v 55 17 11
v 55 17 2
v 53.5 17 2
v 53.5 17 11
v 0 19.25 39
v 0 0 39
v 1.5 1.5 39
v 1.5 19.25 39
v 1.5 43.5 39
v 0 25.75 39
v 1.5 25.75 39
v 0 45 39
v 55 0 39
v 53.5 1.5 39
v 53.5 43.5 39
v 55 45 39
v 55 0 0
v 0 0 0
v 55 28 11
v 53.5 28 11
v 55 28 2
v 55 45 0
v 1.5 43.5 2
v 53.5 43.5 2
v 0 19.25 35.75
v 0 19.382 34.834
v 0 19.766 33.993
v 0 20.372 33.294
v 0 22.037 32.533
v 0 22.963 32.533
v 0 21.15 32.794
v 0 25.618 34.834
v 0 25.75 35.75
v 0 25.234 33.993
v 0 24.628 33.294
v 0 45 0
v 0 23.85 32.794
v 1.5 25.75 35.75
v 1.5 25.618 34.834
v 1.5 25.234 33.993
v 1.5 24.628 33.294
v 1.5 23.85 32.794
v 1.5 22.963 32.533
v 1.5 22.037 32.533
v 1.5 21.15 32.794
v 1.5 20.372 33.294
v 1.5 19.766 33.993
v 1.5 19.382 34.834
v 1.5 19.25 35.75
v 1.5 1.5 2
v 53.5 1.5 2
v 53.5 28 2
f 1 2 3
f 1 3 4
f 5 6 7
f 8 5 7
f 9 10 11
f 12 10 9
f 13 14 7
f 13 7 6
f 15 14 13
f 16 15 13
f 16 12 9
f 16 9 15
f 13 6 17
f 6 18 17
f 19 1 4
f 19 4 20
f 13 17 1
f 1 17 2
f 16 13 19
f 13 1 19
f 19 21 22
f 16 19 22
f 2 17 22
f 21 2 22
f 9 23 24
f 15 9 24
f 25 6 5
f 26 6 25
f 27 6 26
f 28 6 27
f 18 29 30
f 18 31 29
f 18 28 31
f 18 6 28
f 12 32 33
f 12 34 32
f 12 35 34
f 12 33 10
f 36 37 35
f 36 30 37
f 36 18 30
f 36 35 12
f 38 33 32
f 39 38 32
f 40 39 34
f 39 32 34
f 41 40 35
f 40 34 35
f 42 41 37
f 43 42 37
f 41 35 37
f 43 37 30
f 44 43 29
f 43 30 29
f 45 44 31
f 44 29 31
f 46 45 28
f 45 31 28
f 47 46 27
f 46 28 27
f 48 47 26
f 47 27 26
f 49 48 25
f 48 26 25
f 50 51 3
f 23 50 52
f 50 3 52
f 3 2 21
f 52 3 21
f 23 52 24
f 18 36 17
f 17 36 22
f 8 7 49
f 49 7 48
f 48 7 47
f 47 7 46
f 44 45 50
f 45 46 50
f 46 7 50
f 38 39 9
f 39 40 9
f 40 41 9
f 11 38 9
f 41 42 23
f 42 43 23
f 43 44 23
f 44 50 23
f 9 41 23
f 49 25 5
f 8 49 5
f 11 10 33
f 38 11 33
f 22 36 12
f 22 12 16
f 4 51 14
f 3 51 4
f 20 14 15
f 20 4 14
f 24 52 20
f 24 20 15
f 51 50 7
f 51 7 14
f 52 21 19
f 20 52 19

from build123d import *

# Parameters (mm, degrees)
F0_W     = 55
F0_H     = 45
F1_DEPTH = 2
F2_W     = 55
F2_H     = 45
F2_W_2   = 51.9999974966
F2_H_2   = 41.9999974966
F3_DEPTH = 37
F5_DEPTH = 25
F6_W     = 11
F6_H     = 9
F7_DEPTH = 25


with BuildPart() as f1:
    # F0 (on Top) → F1 (new body)
    with BuildSketch(Plane.XY):
        with Locations((27.5, 22.5)):
            Rectangle(F0_W, F0_H)
    extrude(amount=F1_DEPTH)

    # F2 (on face) → F3 (join)
    with BuildSketch(Plane.XY.offset(2)):
        with Locations((27.5, 22.5)):
            Rectangle(F2_W, F2_H)
        with Locations((27.5, 22.5)):
            Rectangle(F2_W_2, F2_H_2, mode=Mode.SUBTRACT)
    extrude(amount=F3_DEPTH)

    # F4 (on face) → F5 (cut)
    with BuildSketch(Plane(origin=(0, 0, 0), x_dir=(0, -1, 0), z_dir=(-1, 0, 0))):
        with BuildLine():
            Line((-25.75, 39), (-25.75, 35.75))
            ThreePointArc((-25.75, 35.75), (-22.5, 32.5), (-19.25, 35.75))
            Line((-19.25, 35.75), (-19.25, 39))
            Line((-19.25, 39), (-25.75, 39))
        make_face()
    extrude(amount=-F5_DEPTH, mode=Mode.SUBTRACT)

    # F6 (on face) → F7 (cut)
    with BuildSketch(Plane.YZ.offset(55)):
        with Locations((22.5, 6.5)):
            Rectangle(F6_W, F6_H)
    extrude(amount=-F7_DEPTH, mode=Mode.SUBTRACT)


solid = f1.part
